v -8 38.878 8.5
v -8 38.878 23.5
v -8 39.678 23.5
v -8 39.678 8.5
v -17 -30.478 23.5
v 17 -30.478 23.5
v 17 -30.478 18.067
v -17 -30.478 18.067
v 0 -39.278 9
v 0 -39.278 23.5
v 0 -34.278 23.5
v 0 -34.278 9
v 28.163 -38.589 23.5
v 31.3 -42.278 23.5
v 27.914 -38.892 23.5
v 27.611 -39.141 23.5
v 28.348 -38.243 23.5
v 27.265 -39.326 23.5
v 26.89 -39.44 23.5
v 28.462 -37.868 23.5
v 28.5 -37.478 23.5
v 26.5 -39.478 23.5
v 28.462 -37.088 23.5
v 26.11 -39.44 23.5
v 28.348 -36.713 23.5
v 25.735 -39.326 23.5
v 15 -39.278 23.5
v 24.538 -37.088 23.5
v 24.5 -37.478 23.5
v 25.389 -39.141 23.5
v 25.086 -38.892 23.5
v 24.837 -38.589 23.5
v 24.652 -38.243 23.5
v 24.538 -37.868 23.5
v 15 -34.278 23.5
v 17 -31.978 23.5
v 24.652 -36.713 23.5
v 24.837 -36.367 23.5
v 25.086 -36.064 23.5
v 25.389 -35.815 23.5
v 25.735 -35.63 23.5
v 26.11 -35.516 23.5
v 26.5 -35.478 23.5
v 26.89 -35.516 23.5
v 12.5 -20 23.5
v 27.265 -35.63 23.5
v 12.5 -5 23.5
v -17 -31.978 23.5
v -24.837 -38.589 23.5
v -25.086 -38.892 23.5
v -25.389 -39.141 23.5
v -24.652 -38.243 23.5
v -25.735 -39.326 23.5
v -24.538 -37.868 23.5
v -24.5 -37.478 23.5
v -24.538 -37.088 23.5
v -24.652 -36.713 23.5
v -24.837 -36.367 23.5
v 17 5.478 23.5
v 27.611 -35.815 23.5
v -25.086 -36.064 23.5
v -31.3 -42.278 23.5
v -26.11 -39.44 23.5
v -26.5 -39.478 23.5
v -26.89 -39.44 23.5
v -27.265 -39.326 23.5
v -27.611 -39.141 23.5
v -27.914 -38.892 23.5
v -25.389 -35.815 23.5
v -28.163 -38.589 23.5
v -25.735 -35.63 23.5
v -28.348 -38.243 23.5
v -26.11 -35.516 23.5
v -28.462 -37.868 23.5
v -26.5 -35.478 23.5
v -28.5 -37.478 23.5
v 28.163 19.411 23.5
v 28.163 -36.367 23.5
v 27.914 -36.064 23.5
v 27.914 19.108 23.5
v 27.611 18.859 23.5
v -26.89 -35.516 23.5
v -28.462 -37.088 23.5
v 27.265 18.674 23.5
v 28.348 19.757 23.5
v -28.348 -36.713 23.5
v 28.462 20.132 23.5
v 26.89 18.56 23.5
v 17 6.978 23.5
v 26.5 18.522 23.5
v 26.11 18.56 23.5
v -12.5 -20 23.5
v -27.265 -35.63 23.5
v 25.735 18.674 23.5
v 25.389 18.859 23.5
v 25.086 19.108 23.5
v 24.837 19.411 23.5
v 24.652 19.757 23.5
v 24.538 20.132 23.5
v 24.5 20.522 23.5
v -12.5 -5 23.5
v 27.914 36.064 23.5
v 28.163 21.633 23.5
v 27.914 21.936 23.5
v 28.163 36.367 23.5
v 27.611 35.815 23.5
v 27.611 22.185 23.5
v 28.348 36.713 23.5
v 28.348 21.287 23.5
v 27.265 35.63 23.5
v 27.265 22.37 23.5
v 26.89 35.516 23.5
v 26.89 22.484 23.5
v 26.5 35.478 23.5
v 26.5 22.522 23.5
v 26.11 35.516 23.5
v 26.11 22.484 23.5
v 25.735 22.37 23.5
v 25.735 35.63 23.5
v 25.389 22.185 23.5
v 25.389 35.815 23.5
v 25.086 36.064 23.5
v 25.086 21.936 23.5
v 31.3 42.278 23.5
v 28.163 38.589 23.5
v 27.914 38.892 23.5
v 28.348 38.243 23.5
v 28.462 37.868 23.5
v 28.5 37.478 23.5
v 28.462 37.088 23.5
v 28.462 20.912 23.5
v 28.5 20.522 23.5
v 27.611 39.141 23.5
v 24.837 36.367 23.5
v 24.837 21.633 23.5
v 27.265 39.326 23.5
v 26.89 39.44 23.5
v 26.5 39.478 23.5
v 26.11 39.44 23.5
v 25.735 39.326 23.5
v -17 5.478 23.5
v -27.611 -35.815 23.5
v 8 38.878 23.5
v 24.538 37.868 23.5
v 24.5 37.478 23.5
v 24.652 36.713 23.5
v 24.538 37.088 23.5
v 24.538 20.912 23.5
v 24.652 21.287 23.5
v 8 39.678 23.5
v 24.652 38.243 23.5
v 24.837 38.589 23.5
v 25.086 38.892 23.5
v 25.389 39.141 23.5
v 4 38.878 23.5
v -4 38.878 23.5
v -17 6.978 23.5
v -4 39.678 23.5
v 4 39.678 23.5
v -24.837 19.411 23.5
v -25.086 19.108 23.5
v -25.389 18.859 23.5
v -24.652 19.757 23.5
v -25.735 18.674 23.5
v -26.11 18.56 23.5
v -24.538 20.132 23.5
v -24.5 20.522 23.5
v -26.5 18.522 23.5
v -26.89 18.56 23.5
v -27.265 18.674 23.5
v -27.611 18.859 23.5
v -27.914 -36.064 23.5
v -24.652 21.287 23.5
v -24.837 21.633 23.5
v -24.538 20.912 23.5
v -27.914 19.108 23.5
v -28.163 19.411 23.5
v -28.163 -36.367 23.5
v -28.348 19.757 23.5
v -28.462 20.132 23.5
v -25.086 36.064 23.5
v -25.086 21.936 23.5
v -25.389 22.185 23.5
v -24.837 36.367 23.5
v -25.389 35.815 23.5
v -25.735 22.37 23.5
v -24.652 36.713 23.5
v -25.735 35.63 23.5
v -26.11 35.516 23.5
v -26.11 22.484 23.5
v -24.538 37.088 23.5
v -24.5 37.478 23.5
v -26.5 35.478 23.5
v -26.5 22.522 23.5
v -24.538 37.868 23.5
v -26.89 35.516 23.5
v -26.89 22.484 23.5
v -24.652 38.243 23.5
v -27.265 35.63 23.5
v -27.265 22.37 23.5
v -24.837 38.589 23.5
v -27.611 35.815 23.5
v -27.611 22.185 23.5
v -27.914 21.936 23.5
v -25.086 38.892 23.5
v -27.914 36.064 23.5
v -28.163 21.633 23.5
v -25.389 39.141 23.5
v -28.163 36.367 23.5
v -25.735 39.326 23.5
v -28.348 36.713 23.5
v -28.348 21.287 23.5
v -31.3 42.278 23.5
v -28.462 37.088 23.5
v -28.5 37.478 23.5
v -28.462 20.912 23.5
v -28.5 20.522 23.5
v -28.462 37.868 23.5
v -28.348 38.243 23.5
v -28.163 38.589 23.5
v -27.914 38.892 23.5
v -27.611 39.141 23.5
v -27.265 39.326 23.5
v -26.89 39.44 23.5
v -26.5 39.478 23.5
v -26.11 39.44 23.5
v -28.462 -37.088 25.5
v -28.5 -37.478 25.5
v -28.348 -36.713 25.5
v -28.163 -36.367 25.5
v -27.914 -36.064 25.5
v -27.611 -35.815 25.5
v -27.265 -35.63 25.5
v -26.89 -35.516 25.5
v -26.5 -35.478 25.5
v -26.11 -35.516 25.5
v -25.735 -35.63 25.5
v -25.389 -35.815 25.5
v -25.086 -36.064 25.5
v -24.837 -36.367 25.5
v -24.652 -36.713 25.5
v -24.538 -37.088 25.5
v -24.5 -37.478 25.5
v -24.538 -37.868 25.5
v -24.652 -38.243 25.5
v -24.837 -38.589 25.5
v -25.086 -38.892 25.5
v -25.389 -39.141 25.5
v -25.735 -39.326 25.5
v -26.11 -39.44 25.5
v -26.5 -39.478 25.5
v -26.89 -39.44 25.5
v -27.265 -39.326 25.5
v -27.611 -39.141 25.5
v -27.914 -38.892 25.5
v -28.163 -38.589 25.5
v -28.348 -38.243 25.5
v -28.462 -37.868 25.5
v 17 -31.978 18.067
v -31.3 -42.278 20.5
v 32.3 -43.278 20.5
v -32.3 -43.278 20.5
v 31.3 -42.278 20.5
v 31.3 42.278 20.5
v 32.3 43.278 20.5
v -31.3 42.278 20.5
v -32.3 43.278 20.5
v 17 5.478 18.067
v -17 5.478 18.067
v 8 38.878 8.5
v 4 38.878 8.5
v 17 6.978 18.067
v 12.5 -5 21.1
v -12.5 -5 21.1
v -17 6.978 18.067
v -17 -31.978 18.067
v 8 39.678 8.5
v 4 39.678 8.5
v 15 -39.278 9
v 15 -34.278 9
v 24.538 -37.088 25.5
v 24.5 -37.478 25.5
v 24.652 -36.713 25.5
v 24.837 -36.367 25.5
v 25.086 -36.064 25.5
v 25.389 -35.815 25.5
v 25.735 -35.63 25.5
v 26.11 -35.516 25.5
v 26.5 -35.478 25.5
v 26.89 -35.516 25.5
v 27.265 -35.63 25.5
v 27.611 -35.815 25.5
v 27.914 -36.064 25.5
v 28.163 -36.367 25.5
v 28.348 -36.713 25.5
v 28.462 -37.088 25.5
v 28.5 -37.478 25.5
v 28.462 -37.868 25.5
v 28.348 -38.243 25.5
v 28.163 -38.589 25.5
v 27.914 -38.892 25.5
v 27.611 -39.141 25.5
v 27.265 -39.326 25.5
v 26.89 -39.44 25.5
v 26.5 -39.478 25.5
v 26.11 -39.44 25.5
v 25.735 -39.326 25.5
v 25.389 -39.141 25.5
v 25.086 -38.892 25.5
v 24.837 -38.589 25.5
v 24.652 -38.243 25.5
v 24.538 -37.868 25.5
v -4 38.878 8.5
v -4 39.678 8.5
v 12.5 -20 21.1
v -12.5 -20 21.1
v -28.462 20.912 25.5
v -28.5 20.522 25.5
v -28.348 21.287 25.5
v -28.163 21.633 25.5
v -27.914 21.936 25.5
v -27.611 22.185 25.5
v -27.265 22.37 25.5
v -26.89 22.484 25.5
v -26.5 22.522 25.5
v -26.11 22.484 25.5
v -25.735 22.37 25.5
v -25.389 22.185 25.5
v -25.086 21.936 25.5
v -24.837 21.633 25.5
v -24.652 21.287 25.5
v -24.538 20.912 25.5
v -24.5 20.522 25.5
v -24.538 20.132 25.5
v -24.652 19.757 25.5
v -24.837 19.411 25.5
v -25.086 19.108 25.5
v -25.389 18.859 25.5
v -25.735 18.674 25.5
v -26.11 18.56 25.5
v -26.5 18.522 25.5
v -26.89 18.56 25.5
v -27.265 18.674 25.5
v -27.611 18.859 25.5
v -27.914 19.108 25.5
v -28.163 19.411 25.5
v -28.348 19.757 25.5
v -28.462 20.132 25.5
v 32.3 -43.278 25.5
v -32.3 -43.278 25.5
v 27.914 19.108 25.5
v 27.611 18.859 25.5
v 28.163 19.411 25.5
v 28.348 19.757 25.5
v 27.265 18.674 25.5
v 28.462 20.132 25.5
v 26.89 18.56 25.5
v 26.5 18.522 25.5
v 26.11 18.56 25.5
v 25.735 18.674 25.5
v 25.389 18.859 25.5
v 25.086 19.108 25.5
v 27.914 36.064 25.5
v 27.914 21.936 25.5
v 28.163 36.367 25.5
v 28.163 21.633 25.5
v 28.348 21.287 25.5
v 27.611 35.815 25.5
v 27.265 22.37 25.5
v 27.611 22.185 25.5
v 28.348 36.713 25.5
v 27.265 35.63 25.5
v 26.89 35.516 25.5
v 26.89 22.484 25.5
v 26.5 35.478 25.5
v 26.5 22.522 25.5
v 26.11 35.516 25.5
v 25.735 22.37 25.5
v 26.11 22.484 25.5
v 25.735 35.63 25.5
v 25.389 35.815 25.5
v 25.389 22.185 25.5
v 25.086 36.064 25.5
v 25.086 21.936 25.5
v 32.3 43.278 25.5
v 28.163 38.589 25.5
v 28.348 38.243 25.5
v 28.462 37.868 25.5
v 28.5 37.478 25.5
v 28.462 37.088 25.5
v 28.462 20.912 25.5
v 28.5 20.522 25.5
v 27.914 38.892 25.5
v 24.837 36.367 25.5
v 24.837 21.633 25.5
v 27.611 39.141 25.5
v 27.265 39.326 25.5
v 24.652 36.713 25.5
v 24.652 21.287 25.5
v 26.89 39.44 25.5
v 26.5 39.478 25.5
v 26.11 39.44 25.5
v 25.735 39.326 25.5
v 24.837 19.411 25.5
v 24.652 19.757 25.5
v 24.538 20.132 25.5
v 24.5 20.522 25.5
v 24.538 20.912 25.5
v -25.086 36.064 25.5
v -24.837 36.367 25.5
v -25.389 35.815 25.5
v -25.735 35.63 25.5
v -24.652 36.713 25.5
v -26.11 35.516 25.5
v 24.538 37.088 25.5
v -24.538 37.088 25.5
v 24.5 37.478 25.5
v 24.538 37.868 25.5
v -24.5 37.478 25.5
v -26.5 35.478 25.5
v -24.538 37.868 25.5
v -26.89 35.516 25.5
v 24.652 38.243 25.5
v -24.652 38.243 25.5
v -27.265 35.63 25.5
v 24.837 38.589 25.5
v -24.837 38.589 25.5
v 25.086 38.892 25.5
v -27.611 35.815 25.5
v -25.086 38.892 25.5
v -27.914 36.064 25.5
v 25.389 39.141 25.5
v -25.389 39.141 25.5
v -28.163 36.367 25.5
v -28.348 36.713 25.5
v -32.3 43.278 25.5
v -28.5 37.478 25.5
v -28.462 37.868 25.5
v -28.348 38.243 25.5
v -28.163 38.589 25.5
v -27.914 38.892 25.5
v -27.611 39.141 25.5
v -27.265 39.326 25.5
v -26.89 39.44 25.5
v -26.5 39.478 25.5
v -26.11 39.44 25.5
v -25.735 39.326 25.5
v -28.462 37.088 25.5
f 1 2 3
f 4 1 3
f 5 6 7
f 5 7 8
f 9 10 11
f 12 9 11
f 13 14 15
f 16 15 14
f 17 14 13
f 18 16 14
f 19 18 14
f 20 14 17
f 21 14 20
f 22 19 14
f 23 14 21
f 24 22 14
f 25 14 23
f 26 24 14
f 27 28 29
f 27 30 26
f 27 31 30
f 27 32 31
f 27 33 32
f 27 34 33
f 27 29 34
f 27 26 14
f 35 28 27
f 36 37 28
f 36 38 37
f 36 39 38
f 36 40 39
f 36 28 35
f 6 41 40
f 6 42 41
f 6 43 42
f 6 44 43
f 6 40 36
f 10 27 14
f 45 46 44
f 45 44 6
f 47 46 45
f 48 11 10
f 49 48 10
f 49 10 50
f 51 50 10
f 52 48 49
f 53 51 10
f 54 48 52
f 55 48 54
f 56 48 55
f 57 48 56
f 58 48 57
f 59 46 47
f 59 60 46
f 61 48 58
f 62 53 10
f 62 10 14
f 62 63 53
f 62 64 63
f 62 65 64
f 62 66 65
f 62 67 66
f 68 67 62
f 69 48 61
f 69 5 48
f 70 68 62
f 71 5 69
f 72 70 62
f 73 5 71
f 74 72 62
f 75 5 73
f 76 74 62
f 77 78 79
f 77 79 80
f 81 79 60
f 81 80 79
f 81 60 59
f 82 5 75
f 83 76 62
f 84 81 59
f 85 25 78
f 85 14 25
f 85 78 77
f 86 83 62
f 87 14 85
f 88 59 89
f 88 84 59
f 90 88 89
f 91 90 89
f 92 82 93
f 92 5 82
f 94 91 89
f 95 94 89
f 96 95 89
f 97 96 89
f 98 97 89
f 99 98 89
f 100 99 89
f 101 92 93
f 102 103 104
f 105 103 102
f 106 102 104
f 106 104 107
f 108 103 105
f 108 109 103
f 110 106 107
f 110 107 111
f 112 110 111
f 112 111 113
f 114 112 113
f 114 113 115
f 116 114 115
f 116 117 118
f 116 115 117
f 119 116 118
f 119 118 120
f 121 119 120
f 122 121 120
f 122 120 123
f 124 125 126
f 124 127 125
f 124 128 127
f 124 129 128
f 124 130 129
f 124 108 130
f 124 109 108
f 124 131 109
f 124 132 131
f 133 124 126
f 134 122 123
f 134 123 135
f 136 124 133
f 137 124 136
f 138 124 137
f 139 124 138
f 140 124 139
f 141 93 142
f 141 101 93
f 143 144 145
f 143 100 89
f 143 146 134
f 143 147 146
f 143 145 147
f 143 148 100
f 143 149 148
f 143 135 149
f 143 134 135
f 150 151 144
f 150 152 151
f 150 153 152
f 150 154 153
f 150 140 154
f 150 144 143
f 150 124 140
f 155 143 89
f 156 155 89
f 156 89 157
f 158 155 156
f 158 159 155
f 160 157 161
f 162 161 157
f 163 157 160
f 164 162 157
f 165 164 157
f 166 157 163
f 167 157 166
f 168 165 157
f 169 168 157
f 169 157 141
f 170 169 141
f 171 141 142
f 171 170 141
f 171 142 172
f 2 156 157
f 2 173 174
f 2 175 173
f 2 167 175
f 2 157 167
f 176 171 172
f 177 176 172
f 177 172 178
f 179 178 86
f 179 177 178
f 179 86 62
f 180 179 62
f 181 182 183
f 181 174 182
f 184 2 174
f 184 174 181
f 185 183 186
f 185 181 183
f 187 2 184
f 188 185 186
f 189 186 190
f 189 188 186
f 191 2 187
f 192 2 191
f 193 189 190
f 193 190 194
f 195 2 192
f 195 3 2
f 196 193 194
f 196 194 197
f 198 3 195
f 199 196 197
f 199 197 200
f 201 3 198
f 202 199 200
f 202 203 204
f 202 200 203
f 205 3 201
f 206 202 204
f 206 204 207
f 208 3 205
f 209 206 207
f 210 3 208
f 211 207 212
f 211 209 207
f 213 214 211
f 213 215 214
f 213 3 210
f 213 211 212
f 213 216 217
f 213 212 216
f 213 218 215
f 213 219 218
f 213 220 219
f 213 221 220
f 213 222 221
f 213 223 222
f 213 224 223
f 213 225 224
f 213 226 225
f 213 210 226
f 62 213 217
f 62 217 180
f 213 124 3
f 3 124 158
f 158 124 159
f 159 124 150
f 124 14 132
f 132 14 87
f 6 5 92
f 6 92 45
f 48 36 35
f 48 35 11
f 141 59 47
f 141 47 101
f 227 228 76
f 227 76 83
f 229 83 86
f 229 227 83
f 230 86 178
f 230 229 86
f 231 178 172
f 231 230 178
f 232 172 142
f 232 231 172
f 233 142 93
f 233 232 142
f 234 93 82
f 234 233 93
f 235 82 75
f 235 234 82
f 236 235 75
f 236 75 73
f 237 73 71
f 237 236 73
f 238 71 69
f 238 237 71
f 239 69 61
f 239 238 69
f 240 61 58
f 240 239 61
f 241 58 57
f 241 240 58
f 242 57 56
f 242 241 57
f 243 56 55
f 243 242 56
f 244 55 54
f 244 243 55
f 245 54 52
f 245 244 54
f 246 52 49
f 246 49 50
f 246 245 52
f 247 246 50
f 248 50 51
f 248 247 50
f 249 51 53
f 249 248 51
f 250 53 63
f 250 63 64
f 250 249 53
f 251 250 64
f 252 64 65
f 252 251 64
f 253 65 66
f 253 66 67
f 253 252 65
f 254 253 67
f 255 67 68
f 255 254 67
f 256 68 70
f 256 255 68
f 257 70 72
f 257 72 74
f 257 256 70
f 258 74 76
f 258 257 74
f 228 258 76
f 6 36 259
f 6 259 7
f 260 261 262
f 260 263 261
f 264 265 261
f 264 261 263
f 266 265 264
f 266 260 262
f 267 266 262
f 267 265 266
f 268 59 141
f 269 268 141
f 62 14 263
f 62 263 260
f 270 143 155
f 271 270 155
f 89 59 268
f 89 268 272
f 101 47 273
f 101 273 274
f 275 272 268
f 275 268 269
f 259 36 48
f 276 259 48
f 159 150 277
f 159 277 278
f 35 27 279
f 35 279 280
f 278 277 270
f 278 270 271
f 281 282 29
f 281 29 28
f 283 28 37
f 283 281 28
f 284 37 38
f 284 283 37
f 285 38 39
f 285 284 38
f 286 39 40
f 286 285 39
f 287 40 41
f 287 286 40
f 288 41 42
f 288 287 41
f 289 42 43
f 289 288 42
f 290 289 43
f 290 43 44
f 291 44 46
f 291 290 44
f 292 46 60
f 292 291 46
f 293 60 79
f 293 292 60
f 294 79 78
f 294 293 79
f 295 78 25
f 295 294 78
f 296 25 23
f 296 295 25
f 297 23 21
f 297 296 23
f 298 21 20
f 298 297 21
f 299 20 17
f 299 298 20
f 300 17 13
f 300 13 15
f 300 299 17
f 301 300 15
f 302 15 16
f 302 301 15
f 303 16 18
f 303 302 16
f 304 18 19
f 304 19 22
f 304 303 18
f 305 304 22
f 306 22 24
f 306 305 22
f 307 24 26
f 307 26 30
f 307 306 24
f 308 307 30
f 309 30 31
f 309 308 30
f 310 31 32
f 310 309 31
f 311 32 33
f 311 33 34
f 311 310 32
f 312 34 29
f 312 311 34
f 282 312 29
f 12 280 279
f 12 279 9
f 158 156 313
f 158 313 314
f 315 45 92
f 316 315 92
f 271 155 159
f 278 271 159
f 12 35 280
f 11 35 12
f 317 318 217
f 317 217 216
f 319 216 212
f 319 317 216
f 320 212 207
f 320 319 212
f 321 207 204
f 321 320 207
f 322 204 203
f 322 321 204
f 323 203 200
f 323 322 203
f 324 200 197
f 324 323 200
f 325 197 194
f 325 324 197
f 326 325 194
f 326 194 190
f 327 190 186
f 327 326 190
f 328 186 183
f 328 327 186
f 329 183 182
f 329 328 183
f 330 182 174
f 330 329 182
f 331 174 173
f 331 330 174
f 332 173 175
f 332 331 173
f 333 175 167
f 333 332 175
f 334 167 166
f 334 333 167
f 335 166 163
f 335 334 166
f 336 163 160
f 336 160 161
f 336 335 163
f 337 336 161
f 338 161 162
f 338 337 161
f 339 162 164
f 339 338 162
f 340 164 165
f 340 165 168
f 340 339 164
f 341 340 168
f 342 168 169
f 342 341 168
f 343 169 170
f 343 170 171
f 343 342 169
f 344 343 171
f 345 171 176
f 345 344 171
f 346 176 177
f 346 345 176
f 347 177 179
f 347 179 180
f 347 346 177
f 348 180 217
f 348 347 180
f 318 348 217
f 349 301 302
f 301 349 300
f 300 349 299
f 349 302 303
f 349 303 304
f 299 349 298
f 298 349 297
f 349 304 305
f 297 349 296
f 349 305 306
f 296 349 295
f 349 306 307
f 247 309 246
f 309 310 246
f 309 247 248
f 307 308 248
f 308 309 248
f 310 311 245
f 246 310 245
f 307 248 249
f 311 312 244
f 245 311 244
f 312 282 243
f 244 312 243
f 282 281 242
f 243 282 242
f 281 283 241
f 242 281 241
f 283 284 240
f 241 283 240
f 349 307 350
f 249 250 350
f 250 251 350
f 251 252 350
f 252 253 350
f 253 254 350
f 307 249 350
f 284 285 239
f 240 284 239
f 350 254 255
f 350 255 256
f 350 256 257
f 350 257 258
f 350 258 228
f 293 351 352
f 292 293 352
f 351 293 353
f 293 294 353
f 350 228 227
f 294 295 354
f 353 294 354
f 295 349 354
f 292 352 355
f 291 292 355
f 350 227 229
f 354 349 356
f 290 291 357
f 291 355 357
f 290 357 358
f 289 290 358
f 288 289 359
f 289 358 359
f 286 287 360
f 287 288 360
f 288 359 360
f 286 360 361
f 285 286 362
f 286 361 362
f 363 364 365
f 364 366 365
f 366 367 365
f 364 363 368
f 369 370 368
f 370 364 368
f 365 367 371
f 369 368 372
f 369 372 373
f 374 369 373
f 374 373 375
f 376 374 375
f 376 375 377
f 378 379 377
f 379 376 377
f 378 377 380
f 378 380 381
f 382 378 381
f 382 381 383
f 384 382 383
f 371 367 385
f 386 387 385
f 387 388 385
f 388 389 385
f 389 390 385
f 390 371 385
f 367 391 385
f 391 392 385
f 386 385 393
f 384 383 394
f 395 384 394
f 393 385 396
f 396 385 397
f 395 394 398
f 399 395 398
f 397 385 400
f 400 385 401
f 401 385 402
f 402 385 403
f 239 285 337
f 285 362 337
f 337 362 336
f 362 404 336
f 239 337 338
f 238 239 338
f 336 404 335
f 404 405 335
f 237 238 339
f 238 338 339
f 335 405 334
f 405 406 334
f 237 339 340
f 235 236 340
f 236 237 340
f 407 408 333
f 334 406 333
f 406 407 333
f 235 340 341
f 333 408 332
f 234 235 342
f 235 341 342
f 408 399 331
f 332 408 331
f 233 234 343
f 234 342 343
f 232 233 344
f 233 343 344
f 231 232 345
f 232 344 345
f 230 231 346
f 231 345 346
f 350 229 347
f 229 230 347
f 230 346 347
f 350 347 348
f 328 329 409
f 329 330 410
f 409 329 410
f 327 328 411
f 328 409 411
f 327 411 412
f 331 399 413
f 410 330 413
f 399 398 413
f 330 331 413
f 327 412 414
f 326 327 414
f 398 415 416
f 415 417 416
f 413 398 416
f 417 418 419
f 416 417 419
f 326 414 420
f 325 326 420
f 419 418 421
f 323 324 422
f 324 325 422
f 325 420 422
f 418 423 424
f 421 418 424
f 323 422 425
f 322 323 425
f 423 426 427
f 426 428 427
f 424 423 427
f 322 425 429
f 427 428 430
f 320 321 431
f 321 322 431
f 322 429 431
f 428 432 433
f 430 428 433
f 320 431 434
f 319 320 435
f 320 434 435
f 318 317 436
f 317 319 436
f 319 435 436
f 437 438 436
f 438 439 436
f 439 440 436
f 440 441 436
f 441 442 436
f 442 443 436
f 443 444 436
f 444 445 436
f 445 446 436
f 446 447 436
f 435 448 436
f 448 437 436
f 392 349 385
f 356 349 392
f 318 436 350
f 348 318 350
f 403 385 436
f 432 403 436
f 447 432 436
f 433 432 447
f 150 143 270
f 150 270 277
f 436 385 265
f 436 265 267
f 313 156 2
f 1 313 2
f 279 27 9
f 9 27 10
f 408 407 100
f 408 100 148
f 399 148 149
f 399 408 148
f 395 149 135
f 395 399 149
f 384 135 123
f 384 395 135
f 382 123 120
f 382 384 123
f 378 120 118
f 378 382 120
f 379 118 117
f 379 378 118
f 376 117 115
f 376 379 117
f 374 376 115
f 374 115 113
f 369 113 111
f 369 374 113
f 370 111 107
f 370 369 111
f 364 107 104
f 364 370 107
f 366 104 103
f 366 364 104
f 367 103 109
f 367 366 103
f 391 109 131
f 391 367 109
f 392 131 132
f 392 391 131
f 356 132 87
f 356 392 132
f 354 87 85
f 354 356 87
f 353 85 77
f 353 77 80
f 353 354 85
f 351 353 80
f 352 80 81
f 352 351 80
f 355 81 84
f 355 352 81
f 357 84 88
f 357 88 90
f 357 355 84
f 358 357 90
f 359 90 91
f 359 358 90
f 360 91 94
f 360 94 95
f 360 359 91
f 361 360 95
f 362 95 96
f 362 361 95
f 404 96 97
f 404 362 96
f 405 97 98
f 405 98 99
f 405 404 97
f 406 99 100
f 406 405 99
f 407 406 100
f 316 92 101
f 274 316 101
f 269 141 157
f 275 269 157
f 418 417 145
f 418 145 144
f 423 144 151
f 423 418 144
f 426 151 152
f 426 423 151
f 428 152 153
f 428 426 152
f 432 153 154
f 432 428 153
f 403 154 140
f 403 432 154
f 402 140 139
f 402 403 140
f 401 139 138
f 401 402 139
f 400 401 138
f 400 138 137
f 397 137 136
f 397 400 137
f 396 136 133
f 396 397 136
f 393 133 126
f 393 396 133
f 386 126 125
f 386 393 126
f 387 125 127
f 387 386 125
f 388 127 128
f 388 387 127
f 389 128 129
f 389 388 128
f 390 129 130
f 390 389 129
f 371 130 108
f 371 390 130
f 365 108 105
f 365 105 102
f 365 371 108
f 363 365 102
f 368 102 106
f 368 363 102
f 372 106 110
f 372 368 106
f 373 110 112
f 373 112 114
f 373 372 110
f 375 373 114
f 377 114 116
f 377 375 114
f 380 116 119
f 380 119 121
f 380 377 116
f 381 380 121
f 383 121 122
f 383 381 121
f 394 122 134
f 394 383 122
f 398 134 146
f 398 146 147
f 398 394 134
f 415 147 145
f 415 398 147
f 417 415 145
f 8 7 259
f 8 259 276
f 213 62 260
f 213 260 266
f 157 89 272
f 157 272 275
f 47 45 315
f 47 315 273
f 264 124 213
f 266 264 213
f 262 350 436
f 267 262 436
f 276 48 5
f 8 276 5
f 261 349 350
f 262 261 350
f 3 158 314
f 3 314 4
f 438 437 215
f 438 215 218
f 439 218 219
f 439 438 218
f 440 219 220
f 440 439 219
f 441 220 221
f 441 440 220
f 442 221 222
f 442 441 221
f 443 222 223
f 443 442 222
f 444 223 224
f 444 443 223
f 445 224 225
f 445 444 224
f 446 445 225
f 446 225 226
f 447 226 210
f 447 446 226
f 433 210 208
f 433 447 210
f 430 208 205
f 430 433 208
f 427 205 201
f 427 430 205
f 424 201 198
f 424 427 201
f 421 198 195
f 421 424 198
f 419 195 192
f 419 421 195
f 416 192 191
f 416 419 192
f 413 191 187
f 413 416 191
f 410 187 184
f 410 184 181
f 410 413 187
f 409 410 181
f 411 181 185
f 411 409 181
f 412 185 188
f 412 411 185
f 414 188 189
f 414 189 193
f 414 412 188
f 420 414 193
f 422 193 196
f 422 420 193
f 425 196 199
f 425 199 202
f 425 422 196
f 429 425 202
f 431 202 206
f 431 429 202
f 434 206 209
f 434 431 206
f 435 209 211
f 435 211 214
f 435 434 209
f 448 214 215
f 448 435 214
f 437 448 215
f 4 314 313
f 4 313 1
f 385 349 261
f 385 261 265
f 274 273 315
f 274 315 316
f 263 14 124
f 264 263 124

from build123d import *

# Parameters (mm, degrees)
SKETCH014_W             = 64.6
SKETCH014_H             = 86.556
PAD009_DEPTH            = 2
SKETCH015_W             = 64.6
SKETCH015_H             = 86.556
SKETCH015_W_2           = 62.6
SKETCH015_H_2           = 84.556
PAD010_DEPTH            = 5
SKETCH016_W             = 34
SKETCH016_H             = 1.5
PAD011_DEPTH            = 7.433333
SKETCH017_W             = 25
SKETCH017_H             = 15
PAD012_DEPTH            = 4.4
SKETCH018_R             = 2
POCKET005_DEPTH         = 2
SKETCH021_W             = 15
SKETCH021_H             = 5
PAD015_DEPTH            = 16.5
SKETCH022_W             = 4
SKETCH022_H             = 0.8
PAD016_DEPTH            = 17
BODY003_PLACEMENT_ANGLE = 180


with BuildPart() as part:
    # Sketch014 → Pad009 (new body)
    with BuildSketch(Plane.XY):
        Rectangle(SKETCH014_W, SKETCH014_H)
    extrude(amount=PAD009_DEPTH)

    # Sketch015 → Pad010 (join)
    with BuildSketch(Plane.XY):
        Rectangle(SKETCH015_W, SKETCH015_H)
        Rectangle(SKETCH015_W_2, SKETCH015_H_2, mode=Mode.SUBTRACT)
    extrude(amount=PAD010_DEPTH)

    # Sketch016 → Pad011 (join)
    with BuildSketch(Plane.XY):
        with Locations((0, 6.228)):
            Rectangle(SKETCH016_W, SKETCH016_H)
        with Locations((0, -31.228)):
            Rectangle(SKETCH016_W, SKETCH016_H)
    extrude(amount=PAD011_DEPTH)

    # Sketch017 → Pad012 (join)
    with BuildSketch(Plane.XY):
        with Locations((0, -12.5)):
            Rectangle(SKETCH017_W, SKETCH017_H)
    extrude(amount=PAD012_DEPTH)

    # Sketch018 → Pocket005 (cut)
    with BuildSketch(Plane.XY):
        with Locations((-26.5, 37.478)):
            Circle(SKETCH018_R)
        with Locations((-26.5, -37.478)):
            Circle(SKETCH018_R)
        with Locations((-26.5, 20.522)):
            Circle(SKETCH018_R)
        with Locations((26.5, 37.478)):
            Circle(SKETCH018_R)
        with Locations((26.5, 20.522)):
            Circle(SKETCH018_R)
        with Locations((26.5, -37.478)):
            Circle(SKETCH018_R)
    extrude(amount=POCKET005_DEPTH, mode=Mode.SUBTRACT)

    # Sketch021 → Pad015 (join)
    with BuildSketch(Plane.XY):
        with Locations((-7.5, -36.778)):
            Rectangle(SKETCH021_W, SKETCH021_H)
    extrude(amount=PAD015_DEPTH)

    # Sketch022 → Pad016 (join)
    with BuildSketch(Plane.XY):
        with Locations((-6, 39.278)):
            Rectangle(SKETCH022_W, SKETCH022_H)
        with Locations((6, 39.278)):
            Rectangle(SKETCH022_W, SKETCH022_H)
    extrude(amount=PAD016_DEPTH)


with BuildPart() as part_1:
    # Body003 placement: moved
    add(part.part.moved(Location((0, 0, 25.5))).rotate(Axis((0, 0, 25.5), (0, 1, 0)), BODY003_PLACEMENT_ANGLE))


solid = part_1.part
